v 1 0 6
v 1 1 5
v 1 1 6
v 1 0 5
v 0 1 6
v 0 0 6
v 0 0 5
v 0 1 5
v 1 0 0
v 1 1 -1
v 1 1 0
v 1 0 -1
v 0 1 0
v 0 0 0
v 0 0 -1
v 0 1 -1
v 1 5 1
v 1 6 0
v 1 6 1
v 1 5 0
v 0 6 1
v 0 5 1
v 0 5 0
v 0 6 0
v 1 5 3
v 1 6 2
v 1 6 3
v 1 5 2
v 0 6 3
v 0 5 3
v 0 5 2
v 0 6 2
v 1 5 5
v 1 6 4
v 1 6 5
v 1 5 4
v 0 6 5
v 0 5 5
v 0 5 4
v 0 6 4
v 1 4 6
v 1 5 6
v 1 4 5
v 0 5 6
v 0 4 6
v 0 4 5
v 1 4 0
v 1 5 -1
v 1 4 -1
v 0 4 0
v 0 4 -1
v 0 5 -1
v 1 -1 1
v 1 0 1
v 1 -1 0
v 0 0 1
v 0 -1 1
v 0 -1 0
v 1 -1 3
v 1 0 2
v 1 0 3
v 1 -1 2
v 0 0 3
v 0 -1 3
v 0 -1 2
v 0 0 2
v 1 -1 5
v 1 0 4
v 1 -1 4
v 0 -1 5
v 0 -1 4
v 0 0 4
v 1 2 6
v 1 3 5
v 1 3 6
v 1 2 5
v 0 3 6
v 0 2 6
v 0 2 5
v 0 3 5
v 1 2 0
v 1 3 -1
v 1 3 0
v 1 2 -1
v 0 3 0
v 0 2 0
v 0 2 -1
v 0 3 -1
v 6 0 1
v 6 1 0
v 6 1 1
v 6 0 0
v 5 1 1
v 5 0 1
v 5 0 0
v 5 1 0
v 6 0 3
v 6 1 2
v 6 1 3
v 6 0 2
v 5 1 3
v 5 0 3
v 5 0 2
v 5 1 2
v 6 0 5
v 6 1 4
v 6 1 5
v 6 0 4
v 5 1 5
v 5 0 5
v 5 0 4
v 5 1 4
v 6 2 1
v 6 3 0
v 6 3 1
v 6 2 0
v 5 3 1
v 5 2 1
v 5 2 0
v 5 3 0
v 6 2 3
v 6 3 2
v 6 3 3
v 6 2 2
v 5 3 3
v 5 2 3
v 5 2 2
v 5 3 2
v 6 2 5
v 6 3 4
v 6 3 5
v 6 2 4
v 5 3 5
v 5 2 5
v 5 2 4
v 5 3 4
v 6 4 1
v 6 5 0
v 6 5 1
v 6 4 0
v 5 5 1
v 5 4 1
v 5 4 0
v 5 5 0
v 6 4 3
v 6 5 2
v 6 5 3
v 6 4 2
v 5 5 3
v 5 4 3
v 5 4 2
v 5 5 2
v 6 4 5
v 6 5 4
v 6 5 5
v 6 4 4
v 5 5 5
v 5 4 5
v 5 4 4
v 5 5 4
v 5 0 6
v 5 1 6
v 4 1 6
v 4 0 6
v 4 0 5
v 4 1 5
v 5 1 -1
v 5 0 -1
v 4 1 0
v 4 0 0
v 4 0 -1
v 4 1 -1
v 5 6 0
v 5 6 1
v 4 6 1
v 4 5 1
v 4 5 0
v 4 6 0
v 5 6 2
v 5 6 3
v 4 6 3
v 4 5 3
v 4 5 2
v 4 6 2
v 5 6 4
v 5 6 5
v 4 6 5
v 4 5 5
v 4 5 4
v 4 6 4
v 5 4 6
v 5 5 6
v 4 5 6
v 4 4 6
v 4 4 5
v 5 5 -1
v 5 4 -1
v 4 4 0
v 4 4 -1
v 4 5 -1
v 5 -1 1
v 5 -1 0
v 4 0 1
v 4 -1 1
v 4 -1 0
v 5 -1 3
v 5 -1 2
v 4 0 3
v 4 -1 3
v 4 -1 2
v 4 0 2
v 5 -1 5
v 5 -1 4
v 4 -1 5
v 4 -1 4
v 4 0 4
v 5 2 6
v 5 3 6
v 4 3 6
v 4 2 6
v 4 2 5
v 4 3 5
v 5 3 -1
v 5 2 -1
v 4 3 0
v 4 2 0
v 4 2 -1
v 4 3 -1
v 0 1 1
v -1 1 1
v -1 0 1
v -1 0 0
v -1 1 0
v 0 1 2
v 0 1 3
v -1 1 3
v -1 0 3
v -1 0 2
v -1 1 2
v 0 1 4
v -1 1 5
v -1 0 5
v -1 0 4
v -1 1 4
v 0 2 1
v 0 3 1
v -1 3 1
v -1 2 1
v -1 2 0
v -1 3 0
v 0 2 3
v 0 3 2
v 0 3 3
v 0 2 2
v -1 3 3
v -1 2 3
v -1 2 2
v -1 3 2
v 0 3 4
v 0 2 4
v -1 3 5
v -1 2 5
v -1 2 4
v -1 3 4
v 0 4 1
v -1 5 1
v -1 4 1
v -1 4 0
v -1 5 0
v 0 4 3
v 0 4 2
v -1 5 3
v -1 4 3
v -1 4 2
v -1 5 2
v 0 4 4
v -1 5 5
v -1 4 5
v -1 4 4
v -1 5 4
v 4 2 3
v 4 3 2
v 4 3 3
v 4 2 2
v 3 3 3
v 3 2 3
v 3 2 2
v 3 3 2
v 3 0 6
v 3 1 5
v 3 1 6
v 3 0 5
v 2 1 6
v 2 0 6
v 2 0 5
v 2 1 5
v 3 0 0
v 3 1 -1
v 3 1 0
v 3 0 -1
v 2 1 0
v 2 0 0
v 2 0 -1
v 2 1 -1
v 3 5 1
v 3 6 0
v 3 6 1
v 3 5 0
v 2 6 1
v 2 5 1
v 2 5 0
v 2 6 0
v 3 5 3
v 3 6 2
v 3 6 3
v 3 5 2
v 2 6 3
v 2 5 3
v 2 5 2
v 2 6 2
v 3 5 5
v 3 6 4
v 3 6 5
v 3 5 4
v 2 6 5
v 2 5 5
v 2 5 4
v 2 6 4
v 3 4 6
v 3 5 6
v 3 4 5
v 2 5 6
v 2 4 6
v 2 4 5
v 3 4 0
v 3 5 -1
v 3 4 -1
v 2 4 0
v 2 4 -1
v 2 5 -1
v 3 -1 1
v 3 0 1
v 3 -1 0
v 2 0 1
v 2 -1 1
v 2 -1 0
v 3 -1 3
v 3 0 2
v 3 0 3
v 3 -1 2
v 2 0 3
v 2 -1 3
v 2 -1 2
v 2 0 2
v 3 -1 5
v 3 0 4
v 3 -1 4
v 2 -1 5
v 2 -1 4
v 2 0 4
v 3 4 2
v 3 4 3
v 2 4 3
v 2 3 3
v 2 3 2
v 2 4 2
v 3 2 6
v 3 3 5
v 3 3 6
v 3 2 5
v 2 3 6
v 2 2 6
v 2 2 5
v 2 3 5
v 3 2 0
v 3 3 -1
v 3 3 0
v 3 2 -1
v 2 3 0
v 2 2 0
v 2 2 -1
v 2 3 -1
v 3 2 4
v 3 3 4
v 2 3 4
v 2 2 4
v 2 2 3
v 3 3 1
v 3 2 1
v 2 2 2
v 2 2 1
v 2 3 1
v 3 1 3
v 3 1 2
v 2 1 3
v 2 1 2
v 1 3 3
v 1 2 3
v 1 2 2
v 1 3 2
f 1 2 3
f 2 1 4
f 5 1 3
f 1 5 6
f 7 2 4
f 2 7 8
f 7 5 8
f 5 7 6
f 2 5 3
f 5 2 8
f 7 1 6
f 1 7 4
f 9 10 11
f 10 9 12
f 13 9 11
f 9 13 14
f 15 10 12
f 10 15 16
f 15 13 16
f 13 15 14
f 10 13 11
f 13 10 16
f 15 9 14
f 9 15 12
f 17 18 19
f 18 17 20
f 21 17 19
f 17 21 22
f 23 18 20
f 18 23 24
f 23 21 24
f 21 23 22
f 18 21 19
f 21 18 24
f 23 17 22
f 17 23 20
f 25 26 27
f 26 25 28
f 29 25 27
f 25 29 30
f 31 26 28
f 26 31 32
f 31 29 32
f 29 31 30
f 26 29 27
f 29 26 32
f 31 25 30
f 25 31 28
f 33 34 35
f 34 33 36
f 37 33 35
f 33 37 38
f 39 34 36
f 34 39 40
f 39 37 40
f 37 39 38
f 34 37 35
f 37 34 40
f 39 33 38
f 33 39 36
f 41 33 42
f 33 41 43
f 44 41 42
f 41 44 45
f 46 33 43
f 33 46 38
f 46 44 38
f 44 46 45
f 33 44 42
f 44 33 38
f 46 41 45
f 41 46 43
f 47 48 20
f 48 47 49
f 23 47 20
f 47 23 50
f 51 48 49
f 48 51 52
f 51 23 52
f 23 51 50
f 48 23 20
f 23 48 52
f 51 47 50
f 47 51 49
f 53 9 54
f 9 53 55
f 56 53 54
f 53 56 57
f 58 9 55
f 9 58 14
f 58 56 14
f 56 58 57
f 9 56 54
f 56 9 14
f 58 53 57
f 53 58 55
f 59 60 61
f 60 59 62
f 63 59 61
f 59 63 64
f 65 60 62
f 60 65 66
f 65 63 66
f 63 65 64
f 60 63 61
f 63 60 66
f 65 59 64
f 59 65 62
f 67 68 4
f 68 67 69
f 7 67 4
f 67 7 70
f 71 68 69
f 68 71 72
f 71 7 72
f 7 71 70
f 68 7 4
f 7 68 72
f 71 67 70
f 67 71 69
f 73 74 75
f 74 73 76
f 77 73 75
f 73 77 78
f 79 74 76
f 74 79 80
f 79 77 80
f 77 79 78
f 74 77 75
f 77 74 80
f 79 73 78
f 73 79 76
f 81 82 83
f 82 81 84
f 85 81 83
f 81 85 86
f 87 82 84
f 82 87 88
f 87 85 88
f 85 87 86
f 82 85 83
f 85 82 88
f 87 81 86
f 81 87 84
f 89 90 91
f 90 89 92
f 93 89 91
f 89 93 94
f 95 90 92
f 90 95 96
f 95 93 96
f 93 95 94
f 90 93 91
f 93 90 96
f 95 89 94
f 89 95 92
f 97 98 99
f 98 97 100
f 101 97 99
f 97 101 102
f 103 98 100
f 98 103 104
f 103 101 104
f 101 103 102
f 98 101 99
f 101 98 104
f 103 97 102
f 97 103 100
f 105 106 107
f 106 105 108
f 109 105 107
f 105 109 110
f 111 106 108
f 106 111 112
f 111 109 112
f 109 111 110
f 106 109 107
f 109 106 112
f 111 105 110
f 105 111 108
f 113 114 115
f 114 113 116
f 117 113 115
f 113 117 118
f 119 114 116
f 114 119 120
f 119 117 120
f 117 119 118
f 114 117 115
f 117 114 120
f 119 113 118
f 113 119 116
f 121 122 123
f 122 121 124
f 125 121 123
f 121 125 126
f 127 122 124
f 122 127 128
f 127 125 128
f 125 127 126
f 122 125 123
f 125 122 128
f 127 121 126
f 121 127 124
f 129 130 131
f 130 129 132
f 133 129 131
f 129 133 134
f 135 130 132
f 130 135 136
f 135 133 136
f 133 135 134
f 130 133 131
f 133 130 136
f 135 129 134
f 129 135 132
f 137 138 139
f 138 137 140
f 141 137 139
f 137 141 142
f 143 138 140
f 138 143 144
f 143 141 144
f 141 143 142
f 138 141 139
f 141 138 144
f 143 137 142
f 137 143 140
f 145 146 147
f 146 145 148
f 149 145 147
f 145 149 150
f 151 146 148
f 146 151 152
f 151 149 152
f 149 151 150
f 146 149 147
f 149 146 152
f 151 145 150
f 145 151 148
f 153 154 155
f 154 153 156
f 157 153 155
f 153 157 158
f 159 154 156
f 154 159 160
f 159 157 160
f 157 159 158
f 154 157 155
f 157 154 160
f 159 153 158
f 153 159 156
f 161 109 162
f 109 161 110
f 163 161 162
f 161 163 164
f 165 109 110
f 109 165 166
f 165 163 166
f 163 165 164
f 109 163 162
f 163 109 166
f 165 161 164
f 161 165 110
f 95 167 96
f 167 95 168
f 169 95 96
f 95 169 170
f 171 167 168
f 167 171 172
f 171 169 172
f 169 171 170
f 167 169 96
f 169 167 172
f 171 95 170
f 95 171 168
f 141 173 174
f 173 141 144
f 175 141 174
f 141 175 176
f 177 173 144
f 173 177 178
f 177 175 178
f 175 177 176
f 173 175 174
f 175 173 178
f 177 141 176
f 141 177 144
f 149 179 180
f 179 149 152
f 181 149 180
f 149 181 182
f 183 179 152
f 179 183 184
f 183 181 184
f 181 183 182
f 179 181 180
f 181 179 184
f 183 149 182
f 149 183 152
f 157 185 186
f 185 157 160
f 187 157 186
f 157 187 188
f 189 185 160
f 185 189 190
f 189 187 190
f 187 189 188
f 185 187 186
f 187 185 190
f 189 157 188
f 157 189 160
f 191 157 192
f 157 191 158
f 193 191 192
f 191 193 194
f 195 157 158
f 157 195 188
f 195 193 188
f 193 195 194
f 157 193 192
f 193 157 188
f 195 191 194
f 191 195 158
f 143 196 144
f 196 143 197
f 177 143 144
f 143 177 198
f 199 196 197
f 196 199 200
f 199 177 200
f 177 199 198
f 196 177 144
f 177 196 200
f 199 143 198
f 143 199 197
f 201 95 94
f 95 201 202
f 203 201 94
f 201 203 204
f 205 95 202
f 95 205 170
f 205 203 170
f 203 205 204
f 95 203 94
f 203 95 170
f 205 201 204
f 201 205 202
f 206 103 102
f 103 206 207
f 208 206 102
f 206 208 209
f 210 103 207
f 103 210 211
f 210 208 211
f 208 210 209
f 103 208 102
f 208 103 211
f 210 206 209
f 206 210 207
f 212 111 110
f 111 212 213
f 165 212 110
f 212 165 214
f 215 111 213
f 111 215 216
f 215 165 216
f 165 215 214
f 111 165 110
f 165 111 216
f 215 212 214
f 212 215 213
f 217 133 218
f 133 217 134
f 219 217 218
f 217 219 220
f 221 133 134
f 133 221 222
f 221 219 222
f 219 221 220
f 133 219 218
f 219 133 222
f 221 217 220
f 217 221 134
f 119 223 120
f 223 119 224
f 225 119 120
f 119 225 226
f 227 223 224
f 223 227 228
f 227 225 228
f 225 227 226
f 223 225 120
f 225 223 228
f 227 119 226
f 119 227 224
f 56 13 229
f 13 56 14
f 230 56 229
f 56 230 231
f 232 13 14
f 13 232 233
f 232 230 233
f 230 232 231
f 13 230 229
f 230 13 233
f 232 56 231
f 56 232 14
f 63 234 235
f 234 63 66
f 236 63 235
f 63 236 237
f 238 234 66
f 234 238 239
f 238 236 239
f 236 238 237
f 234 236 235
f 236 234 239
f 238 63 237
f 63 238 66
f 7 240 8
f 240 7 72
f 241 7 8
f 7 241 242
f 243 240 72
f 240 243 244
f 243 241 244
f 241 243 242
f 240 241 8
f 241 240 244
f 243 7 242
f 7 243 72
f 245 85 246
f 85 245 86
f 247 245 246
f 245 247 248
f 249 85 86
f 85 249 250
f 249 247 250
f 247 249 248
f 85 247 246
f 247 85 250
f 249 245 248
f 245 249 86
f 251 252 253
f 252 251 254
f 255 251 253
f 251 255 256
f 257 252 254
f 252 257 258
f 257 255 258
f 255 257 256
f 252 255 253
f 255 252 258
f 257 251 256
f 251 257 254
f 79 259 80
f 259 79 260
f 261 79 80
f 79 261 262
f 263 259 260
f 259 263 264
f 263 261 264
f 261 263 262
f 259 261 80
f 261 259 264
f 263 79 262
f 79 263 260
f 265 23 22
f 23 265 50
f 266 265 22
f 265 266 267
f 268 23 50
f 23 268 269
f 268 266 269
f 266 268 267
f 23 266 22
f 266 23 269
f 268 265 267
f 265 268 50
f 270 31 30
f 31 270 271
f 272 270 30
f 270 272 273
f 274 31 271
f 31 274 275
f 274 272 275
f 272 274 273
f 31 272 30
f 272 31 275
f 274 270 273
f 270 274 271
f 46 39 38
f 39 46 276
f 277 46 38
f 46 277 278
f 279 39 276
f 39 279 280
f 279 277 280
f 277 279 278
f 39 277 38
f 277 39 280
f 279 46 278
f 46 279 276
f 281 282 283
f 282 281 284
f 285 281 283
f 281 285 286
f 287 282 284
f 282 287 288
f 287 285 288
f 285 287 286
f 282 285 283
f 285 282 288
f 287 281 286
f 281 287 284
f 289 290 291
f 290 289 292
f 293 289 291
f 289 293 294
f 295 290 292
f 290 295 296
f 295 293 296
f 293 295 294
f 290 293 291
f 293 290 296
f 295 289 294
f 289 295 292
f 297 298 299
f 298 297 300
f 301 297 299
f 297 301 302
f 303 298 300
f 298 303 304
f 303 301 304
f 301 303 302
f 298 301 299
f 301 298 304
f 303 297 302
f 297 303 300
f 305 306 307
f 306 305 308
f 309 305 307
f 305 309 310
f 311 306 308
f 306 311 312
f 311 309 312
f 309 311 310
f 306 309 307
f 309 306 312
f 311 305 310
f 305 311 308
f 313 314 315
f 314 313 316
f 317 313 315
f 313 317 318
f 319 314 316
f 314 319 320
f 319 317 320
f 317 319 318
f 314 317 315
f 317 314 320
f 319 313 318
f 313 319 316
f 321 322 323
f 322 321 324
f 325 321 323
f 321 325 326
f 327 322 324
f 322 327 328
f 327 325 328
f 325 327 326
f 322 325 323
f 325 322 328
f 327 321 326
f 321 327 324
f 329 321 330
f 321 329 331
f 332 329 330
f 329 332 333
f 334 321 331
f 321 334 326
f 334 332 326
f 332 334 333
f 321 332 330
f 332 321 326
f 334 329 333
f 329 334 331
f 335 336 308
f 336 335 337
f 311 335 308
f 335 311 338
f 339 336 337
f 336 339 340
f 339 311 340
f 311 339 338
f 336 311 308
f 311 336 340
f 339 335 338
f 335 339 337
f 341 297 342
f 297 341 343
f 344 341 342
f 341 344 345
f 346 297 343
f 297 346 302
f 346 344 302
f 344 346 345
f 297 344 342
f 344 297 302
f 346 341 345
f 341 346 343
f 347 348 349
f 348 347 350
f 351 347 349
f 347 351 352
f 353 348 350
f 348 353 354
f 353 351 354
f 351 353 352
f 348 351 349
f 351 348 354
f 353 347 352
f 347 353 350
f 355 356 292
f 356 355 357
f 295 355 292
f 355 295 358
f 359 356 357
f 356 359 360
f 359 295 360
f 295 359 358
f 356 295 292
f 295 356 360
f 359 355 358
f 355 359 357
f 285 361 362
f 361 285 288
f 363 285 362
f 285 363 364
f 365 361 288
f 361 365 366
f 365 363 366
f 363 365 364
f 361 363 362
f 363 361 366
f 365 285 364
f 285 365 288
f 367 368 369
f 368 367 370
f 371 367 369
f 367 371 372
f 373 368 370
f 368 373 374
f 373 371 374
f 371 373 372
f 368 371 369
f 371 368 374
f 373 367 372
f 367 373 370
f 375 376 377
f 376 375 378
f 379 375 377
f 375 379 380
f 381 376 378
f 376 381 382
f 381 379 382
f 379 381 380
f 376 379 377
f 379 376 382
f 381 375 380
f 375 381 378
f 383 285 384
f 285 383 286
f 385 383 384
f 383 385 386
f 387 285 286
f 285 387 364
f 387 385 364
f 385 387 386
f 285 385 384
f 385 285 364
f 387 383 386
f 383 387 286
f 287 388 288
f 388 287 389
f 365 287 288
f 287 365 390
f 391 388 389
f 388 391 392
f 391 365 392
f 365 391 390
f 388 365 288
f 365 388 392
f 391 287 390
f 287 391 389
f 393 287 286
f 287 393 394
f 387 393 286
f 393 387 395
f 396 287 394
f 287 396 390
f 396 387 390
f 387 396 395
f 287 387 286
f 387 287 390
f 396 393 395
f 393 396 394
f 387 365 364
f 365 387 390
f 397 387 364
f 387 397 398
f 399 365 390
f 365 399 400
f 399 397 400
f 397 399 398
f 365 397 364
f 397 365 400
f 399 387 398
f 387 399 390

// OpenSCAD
translate([ 0,  0,  5]) cube(1);
translate([ 0,  0, -1]) cube(1);
translate([ 0,  5,  0]) cube(1);
translate([ 0,  5,  2]) cube(1);
translate([ 0,  5,  4]) cube(1);
translate([ 0,  4,  5]) cube(1);
translate([ 0,  4, -1]) cube(1);
translate([ 0, -1,  0]) cube(1);
translate([ 0, -1,  2]) cube(1);
translate([ 0, -1,  4]) cube(1);
translate([ 0,  2,  5]) cube(1);
translate([ 0,  2, -1]) cube(1);
translate([ 5,  0,  0]) cube(1);
translate([ 5,  0,  2]) cube(1);
translate([ 5,  0,  4]) cube(1);
translate([ 5,  2,  0]) cube(1);
translate([ 5,  2,  2]) cube(1);
translate([ 5,  2,  4]) cube(1);
translate([ 5,  4,  0]) cube(1);
translate([ 5,  4,  2]) cube(1);
translate([ 5,  4,  4]) cube(1);
translate([ 4,  0,  5]) cube(1);
translate([ 4,  0, -1]) cube(1);
translate([ 4,  5,  0]) cube(1);
translate([ 4,  5,  2]) cube(1);
translate([ 4,  5,  4]) cube(1);
translate([ 4,  4,  5]) cube(1);
translate([ 4,  4, -1]) cube(1);
translate([ 4, -1,  0]) cube(1);
translate([ 4, -1,  2]) cube(1);
translate([ 4, -1,  4]) cube(1);
translate([ 4,  2,  5]) cube(1);
translate([ 4,  2, -1]) cube(1);
translate([-1,  0,  0]) cube(1);
translate([-1,  0,  2]) cube(1);
translate([-1,  0,  4]) cube(1);
translate([-1,  2,  0]) cube(1);
translate([-1,  2,  2]) cube(1);
translate([-1,  2,  4]) cube(1);
translate([-1,  4,  0]) cube(1);
translate([-1,  4,  2]) cube(1);
translate([-1,  4,  4]) cube(1);
translate([ 3,  2,  2]) cube(1);
translate([ 2,  0,  5]) cube(1);
translate([ 2,  0, -1]) cube(1);
translate([ 2,  5,  0]) cube(1);
translate([ 2,  5,  2]) cube(1);
translate([ 2,  5,  4]) cube(1);
translate([ 2,  4,  5]) cube(1);
translate([ 2,  4, -1]) cube(1);
translate([ 2, -1,  0]) cube(1);
translate([ 2, -1,  2]) cube(1);
translate([ 2, -1,  4]) cube(1);
translate([ 2,  3,  2]) cube(1);
translate([ 2,  2,  5]) cube(1);
translate([ 2,  2, -1]) cube(1);
translate([ 2,  2,  3]) cube(1);
translate([ 2,  2,  1]) cube(1);
translate([ 2,  1,  2]) cube(1);
translate([ 1,  2,  2]) cube(1);
